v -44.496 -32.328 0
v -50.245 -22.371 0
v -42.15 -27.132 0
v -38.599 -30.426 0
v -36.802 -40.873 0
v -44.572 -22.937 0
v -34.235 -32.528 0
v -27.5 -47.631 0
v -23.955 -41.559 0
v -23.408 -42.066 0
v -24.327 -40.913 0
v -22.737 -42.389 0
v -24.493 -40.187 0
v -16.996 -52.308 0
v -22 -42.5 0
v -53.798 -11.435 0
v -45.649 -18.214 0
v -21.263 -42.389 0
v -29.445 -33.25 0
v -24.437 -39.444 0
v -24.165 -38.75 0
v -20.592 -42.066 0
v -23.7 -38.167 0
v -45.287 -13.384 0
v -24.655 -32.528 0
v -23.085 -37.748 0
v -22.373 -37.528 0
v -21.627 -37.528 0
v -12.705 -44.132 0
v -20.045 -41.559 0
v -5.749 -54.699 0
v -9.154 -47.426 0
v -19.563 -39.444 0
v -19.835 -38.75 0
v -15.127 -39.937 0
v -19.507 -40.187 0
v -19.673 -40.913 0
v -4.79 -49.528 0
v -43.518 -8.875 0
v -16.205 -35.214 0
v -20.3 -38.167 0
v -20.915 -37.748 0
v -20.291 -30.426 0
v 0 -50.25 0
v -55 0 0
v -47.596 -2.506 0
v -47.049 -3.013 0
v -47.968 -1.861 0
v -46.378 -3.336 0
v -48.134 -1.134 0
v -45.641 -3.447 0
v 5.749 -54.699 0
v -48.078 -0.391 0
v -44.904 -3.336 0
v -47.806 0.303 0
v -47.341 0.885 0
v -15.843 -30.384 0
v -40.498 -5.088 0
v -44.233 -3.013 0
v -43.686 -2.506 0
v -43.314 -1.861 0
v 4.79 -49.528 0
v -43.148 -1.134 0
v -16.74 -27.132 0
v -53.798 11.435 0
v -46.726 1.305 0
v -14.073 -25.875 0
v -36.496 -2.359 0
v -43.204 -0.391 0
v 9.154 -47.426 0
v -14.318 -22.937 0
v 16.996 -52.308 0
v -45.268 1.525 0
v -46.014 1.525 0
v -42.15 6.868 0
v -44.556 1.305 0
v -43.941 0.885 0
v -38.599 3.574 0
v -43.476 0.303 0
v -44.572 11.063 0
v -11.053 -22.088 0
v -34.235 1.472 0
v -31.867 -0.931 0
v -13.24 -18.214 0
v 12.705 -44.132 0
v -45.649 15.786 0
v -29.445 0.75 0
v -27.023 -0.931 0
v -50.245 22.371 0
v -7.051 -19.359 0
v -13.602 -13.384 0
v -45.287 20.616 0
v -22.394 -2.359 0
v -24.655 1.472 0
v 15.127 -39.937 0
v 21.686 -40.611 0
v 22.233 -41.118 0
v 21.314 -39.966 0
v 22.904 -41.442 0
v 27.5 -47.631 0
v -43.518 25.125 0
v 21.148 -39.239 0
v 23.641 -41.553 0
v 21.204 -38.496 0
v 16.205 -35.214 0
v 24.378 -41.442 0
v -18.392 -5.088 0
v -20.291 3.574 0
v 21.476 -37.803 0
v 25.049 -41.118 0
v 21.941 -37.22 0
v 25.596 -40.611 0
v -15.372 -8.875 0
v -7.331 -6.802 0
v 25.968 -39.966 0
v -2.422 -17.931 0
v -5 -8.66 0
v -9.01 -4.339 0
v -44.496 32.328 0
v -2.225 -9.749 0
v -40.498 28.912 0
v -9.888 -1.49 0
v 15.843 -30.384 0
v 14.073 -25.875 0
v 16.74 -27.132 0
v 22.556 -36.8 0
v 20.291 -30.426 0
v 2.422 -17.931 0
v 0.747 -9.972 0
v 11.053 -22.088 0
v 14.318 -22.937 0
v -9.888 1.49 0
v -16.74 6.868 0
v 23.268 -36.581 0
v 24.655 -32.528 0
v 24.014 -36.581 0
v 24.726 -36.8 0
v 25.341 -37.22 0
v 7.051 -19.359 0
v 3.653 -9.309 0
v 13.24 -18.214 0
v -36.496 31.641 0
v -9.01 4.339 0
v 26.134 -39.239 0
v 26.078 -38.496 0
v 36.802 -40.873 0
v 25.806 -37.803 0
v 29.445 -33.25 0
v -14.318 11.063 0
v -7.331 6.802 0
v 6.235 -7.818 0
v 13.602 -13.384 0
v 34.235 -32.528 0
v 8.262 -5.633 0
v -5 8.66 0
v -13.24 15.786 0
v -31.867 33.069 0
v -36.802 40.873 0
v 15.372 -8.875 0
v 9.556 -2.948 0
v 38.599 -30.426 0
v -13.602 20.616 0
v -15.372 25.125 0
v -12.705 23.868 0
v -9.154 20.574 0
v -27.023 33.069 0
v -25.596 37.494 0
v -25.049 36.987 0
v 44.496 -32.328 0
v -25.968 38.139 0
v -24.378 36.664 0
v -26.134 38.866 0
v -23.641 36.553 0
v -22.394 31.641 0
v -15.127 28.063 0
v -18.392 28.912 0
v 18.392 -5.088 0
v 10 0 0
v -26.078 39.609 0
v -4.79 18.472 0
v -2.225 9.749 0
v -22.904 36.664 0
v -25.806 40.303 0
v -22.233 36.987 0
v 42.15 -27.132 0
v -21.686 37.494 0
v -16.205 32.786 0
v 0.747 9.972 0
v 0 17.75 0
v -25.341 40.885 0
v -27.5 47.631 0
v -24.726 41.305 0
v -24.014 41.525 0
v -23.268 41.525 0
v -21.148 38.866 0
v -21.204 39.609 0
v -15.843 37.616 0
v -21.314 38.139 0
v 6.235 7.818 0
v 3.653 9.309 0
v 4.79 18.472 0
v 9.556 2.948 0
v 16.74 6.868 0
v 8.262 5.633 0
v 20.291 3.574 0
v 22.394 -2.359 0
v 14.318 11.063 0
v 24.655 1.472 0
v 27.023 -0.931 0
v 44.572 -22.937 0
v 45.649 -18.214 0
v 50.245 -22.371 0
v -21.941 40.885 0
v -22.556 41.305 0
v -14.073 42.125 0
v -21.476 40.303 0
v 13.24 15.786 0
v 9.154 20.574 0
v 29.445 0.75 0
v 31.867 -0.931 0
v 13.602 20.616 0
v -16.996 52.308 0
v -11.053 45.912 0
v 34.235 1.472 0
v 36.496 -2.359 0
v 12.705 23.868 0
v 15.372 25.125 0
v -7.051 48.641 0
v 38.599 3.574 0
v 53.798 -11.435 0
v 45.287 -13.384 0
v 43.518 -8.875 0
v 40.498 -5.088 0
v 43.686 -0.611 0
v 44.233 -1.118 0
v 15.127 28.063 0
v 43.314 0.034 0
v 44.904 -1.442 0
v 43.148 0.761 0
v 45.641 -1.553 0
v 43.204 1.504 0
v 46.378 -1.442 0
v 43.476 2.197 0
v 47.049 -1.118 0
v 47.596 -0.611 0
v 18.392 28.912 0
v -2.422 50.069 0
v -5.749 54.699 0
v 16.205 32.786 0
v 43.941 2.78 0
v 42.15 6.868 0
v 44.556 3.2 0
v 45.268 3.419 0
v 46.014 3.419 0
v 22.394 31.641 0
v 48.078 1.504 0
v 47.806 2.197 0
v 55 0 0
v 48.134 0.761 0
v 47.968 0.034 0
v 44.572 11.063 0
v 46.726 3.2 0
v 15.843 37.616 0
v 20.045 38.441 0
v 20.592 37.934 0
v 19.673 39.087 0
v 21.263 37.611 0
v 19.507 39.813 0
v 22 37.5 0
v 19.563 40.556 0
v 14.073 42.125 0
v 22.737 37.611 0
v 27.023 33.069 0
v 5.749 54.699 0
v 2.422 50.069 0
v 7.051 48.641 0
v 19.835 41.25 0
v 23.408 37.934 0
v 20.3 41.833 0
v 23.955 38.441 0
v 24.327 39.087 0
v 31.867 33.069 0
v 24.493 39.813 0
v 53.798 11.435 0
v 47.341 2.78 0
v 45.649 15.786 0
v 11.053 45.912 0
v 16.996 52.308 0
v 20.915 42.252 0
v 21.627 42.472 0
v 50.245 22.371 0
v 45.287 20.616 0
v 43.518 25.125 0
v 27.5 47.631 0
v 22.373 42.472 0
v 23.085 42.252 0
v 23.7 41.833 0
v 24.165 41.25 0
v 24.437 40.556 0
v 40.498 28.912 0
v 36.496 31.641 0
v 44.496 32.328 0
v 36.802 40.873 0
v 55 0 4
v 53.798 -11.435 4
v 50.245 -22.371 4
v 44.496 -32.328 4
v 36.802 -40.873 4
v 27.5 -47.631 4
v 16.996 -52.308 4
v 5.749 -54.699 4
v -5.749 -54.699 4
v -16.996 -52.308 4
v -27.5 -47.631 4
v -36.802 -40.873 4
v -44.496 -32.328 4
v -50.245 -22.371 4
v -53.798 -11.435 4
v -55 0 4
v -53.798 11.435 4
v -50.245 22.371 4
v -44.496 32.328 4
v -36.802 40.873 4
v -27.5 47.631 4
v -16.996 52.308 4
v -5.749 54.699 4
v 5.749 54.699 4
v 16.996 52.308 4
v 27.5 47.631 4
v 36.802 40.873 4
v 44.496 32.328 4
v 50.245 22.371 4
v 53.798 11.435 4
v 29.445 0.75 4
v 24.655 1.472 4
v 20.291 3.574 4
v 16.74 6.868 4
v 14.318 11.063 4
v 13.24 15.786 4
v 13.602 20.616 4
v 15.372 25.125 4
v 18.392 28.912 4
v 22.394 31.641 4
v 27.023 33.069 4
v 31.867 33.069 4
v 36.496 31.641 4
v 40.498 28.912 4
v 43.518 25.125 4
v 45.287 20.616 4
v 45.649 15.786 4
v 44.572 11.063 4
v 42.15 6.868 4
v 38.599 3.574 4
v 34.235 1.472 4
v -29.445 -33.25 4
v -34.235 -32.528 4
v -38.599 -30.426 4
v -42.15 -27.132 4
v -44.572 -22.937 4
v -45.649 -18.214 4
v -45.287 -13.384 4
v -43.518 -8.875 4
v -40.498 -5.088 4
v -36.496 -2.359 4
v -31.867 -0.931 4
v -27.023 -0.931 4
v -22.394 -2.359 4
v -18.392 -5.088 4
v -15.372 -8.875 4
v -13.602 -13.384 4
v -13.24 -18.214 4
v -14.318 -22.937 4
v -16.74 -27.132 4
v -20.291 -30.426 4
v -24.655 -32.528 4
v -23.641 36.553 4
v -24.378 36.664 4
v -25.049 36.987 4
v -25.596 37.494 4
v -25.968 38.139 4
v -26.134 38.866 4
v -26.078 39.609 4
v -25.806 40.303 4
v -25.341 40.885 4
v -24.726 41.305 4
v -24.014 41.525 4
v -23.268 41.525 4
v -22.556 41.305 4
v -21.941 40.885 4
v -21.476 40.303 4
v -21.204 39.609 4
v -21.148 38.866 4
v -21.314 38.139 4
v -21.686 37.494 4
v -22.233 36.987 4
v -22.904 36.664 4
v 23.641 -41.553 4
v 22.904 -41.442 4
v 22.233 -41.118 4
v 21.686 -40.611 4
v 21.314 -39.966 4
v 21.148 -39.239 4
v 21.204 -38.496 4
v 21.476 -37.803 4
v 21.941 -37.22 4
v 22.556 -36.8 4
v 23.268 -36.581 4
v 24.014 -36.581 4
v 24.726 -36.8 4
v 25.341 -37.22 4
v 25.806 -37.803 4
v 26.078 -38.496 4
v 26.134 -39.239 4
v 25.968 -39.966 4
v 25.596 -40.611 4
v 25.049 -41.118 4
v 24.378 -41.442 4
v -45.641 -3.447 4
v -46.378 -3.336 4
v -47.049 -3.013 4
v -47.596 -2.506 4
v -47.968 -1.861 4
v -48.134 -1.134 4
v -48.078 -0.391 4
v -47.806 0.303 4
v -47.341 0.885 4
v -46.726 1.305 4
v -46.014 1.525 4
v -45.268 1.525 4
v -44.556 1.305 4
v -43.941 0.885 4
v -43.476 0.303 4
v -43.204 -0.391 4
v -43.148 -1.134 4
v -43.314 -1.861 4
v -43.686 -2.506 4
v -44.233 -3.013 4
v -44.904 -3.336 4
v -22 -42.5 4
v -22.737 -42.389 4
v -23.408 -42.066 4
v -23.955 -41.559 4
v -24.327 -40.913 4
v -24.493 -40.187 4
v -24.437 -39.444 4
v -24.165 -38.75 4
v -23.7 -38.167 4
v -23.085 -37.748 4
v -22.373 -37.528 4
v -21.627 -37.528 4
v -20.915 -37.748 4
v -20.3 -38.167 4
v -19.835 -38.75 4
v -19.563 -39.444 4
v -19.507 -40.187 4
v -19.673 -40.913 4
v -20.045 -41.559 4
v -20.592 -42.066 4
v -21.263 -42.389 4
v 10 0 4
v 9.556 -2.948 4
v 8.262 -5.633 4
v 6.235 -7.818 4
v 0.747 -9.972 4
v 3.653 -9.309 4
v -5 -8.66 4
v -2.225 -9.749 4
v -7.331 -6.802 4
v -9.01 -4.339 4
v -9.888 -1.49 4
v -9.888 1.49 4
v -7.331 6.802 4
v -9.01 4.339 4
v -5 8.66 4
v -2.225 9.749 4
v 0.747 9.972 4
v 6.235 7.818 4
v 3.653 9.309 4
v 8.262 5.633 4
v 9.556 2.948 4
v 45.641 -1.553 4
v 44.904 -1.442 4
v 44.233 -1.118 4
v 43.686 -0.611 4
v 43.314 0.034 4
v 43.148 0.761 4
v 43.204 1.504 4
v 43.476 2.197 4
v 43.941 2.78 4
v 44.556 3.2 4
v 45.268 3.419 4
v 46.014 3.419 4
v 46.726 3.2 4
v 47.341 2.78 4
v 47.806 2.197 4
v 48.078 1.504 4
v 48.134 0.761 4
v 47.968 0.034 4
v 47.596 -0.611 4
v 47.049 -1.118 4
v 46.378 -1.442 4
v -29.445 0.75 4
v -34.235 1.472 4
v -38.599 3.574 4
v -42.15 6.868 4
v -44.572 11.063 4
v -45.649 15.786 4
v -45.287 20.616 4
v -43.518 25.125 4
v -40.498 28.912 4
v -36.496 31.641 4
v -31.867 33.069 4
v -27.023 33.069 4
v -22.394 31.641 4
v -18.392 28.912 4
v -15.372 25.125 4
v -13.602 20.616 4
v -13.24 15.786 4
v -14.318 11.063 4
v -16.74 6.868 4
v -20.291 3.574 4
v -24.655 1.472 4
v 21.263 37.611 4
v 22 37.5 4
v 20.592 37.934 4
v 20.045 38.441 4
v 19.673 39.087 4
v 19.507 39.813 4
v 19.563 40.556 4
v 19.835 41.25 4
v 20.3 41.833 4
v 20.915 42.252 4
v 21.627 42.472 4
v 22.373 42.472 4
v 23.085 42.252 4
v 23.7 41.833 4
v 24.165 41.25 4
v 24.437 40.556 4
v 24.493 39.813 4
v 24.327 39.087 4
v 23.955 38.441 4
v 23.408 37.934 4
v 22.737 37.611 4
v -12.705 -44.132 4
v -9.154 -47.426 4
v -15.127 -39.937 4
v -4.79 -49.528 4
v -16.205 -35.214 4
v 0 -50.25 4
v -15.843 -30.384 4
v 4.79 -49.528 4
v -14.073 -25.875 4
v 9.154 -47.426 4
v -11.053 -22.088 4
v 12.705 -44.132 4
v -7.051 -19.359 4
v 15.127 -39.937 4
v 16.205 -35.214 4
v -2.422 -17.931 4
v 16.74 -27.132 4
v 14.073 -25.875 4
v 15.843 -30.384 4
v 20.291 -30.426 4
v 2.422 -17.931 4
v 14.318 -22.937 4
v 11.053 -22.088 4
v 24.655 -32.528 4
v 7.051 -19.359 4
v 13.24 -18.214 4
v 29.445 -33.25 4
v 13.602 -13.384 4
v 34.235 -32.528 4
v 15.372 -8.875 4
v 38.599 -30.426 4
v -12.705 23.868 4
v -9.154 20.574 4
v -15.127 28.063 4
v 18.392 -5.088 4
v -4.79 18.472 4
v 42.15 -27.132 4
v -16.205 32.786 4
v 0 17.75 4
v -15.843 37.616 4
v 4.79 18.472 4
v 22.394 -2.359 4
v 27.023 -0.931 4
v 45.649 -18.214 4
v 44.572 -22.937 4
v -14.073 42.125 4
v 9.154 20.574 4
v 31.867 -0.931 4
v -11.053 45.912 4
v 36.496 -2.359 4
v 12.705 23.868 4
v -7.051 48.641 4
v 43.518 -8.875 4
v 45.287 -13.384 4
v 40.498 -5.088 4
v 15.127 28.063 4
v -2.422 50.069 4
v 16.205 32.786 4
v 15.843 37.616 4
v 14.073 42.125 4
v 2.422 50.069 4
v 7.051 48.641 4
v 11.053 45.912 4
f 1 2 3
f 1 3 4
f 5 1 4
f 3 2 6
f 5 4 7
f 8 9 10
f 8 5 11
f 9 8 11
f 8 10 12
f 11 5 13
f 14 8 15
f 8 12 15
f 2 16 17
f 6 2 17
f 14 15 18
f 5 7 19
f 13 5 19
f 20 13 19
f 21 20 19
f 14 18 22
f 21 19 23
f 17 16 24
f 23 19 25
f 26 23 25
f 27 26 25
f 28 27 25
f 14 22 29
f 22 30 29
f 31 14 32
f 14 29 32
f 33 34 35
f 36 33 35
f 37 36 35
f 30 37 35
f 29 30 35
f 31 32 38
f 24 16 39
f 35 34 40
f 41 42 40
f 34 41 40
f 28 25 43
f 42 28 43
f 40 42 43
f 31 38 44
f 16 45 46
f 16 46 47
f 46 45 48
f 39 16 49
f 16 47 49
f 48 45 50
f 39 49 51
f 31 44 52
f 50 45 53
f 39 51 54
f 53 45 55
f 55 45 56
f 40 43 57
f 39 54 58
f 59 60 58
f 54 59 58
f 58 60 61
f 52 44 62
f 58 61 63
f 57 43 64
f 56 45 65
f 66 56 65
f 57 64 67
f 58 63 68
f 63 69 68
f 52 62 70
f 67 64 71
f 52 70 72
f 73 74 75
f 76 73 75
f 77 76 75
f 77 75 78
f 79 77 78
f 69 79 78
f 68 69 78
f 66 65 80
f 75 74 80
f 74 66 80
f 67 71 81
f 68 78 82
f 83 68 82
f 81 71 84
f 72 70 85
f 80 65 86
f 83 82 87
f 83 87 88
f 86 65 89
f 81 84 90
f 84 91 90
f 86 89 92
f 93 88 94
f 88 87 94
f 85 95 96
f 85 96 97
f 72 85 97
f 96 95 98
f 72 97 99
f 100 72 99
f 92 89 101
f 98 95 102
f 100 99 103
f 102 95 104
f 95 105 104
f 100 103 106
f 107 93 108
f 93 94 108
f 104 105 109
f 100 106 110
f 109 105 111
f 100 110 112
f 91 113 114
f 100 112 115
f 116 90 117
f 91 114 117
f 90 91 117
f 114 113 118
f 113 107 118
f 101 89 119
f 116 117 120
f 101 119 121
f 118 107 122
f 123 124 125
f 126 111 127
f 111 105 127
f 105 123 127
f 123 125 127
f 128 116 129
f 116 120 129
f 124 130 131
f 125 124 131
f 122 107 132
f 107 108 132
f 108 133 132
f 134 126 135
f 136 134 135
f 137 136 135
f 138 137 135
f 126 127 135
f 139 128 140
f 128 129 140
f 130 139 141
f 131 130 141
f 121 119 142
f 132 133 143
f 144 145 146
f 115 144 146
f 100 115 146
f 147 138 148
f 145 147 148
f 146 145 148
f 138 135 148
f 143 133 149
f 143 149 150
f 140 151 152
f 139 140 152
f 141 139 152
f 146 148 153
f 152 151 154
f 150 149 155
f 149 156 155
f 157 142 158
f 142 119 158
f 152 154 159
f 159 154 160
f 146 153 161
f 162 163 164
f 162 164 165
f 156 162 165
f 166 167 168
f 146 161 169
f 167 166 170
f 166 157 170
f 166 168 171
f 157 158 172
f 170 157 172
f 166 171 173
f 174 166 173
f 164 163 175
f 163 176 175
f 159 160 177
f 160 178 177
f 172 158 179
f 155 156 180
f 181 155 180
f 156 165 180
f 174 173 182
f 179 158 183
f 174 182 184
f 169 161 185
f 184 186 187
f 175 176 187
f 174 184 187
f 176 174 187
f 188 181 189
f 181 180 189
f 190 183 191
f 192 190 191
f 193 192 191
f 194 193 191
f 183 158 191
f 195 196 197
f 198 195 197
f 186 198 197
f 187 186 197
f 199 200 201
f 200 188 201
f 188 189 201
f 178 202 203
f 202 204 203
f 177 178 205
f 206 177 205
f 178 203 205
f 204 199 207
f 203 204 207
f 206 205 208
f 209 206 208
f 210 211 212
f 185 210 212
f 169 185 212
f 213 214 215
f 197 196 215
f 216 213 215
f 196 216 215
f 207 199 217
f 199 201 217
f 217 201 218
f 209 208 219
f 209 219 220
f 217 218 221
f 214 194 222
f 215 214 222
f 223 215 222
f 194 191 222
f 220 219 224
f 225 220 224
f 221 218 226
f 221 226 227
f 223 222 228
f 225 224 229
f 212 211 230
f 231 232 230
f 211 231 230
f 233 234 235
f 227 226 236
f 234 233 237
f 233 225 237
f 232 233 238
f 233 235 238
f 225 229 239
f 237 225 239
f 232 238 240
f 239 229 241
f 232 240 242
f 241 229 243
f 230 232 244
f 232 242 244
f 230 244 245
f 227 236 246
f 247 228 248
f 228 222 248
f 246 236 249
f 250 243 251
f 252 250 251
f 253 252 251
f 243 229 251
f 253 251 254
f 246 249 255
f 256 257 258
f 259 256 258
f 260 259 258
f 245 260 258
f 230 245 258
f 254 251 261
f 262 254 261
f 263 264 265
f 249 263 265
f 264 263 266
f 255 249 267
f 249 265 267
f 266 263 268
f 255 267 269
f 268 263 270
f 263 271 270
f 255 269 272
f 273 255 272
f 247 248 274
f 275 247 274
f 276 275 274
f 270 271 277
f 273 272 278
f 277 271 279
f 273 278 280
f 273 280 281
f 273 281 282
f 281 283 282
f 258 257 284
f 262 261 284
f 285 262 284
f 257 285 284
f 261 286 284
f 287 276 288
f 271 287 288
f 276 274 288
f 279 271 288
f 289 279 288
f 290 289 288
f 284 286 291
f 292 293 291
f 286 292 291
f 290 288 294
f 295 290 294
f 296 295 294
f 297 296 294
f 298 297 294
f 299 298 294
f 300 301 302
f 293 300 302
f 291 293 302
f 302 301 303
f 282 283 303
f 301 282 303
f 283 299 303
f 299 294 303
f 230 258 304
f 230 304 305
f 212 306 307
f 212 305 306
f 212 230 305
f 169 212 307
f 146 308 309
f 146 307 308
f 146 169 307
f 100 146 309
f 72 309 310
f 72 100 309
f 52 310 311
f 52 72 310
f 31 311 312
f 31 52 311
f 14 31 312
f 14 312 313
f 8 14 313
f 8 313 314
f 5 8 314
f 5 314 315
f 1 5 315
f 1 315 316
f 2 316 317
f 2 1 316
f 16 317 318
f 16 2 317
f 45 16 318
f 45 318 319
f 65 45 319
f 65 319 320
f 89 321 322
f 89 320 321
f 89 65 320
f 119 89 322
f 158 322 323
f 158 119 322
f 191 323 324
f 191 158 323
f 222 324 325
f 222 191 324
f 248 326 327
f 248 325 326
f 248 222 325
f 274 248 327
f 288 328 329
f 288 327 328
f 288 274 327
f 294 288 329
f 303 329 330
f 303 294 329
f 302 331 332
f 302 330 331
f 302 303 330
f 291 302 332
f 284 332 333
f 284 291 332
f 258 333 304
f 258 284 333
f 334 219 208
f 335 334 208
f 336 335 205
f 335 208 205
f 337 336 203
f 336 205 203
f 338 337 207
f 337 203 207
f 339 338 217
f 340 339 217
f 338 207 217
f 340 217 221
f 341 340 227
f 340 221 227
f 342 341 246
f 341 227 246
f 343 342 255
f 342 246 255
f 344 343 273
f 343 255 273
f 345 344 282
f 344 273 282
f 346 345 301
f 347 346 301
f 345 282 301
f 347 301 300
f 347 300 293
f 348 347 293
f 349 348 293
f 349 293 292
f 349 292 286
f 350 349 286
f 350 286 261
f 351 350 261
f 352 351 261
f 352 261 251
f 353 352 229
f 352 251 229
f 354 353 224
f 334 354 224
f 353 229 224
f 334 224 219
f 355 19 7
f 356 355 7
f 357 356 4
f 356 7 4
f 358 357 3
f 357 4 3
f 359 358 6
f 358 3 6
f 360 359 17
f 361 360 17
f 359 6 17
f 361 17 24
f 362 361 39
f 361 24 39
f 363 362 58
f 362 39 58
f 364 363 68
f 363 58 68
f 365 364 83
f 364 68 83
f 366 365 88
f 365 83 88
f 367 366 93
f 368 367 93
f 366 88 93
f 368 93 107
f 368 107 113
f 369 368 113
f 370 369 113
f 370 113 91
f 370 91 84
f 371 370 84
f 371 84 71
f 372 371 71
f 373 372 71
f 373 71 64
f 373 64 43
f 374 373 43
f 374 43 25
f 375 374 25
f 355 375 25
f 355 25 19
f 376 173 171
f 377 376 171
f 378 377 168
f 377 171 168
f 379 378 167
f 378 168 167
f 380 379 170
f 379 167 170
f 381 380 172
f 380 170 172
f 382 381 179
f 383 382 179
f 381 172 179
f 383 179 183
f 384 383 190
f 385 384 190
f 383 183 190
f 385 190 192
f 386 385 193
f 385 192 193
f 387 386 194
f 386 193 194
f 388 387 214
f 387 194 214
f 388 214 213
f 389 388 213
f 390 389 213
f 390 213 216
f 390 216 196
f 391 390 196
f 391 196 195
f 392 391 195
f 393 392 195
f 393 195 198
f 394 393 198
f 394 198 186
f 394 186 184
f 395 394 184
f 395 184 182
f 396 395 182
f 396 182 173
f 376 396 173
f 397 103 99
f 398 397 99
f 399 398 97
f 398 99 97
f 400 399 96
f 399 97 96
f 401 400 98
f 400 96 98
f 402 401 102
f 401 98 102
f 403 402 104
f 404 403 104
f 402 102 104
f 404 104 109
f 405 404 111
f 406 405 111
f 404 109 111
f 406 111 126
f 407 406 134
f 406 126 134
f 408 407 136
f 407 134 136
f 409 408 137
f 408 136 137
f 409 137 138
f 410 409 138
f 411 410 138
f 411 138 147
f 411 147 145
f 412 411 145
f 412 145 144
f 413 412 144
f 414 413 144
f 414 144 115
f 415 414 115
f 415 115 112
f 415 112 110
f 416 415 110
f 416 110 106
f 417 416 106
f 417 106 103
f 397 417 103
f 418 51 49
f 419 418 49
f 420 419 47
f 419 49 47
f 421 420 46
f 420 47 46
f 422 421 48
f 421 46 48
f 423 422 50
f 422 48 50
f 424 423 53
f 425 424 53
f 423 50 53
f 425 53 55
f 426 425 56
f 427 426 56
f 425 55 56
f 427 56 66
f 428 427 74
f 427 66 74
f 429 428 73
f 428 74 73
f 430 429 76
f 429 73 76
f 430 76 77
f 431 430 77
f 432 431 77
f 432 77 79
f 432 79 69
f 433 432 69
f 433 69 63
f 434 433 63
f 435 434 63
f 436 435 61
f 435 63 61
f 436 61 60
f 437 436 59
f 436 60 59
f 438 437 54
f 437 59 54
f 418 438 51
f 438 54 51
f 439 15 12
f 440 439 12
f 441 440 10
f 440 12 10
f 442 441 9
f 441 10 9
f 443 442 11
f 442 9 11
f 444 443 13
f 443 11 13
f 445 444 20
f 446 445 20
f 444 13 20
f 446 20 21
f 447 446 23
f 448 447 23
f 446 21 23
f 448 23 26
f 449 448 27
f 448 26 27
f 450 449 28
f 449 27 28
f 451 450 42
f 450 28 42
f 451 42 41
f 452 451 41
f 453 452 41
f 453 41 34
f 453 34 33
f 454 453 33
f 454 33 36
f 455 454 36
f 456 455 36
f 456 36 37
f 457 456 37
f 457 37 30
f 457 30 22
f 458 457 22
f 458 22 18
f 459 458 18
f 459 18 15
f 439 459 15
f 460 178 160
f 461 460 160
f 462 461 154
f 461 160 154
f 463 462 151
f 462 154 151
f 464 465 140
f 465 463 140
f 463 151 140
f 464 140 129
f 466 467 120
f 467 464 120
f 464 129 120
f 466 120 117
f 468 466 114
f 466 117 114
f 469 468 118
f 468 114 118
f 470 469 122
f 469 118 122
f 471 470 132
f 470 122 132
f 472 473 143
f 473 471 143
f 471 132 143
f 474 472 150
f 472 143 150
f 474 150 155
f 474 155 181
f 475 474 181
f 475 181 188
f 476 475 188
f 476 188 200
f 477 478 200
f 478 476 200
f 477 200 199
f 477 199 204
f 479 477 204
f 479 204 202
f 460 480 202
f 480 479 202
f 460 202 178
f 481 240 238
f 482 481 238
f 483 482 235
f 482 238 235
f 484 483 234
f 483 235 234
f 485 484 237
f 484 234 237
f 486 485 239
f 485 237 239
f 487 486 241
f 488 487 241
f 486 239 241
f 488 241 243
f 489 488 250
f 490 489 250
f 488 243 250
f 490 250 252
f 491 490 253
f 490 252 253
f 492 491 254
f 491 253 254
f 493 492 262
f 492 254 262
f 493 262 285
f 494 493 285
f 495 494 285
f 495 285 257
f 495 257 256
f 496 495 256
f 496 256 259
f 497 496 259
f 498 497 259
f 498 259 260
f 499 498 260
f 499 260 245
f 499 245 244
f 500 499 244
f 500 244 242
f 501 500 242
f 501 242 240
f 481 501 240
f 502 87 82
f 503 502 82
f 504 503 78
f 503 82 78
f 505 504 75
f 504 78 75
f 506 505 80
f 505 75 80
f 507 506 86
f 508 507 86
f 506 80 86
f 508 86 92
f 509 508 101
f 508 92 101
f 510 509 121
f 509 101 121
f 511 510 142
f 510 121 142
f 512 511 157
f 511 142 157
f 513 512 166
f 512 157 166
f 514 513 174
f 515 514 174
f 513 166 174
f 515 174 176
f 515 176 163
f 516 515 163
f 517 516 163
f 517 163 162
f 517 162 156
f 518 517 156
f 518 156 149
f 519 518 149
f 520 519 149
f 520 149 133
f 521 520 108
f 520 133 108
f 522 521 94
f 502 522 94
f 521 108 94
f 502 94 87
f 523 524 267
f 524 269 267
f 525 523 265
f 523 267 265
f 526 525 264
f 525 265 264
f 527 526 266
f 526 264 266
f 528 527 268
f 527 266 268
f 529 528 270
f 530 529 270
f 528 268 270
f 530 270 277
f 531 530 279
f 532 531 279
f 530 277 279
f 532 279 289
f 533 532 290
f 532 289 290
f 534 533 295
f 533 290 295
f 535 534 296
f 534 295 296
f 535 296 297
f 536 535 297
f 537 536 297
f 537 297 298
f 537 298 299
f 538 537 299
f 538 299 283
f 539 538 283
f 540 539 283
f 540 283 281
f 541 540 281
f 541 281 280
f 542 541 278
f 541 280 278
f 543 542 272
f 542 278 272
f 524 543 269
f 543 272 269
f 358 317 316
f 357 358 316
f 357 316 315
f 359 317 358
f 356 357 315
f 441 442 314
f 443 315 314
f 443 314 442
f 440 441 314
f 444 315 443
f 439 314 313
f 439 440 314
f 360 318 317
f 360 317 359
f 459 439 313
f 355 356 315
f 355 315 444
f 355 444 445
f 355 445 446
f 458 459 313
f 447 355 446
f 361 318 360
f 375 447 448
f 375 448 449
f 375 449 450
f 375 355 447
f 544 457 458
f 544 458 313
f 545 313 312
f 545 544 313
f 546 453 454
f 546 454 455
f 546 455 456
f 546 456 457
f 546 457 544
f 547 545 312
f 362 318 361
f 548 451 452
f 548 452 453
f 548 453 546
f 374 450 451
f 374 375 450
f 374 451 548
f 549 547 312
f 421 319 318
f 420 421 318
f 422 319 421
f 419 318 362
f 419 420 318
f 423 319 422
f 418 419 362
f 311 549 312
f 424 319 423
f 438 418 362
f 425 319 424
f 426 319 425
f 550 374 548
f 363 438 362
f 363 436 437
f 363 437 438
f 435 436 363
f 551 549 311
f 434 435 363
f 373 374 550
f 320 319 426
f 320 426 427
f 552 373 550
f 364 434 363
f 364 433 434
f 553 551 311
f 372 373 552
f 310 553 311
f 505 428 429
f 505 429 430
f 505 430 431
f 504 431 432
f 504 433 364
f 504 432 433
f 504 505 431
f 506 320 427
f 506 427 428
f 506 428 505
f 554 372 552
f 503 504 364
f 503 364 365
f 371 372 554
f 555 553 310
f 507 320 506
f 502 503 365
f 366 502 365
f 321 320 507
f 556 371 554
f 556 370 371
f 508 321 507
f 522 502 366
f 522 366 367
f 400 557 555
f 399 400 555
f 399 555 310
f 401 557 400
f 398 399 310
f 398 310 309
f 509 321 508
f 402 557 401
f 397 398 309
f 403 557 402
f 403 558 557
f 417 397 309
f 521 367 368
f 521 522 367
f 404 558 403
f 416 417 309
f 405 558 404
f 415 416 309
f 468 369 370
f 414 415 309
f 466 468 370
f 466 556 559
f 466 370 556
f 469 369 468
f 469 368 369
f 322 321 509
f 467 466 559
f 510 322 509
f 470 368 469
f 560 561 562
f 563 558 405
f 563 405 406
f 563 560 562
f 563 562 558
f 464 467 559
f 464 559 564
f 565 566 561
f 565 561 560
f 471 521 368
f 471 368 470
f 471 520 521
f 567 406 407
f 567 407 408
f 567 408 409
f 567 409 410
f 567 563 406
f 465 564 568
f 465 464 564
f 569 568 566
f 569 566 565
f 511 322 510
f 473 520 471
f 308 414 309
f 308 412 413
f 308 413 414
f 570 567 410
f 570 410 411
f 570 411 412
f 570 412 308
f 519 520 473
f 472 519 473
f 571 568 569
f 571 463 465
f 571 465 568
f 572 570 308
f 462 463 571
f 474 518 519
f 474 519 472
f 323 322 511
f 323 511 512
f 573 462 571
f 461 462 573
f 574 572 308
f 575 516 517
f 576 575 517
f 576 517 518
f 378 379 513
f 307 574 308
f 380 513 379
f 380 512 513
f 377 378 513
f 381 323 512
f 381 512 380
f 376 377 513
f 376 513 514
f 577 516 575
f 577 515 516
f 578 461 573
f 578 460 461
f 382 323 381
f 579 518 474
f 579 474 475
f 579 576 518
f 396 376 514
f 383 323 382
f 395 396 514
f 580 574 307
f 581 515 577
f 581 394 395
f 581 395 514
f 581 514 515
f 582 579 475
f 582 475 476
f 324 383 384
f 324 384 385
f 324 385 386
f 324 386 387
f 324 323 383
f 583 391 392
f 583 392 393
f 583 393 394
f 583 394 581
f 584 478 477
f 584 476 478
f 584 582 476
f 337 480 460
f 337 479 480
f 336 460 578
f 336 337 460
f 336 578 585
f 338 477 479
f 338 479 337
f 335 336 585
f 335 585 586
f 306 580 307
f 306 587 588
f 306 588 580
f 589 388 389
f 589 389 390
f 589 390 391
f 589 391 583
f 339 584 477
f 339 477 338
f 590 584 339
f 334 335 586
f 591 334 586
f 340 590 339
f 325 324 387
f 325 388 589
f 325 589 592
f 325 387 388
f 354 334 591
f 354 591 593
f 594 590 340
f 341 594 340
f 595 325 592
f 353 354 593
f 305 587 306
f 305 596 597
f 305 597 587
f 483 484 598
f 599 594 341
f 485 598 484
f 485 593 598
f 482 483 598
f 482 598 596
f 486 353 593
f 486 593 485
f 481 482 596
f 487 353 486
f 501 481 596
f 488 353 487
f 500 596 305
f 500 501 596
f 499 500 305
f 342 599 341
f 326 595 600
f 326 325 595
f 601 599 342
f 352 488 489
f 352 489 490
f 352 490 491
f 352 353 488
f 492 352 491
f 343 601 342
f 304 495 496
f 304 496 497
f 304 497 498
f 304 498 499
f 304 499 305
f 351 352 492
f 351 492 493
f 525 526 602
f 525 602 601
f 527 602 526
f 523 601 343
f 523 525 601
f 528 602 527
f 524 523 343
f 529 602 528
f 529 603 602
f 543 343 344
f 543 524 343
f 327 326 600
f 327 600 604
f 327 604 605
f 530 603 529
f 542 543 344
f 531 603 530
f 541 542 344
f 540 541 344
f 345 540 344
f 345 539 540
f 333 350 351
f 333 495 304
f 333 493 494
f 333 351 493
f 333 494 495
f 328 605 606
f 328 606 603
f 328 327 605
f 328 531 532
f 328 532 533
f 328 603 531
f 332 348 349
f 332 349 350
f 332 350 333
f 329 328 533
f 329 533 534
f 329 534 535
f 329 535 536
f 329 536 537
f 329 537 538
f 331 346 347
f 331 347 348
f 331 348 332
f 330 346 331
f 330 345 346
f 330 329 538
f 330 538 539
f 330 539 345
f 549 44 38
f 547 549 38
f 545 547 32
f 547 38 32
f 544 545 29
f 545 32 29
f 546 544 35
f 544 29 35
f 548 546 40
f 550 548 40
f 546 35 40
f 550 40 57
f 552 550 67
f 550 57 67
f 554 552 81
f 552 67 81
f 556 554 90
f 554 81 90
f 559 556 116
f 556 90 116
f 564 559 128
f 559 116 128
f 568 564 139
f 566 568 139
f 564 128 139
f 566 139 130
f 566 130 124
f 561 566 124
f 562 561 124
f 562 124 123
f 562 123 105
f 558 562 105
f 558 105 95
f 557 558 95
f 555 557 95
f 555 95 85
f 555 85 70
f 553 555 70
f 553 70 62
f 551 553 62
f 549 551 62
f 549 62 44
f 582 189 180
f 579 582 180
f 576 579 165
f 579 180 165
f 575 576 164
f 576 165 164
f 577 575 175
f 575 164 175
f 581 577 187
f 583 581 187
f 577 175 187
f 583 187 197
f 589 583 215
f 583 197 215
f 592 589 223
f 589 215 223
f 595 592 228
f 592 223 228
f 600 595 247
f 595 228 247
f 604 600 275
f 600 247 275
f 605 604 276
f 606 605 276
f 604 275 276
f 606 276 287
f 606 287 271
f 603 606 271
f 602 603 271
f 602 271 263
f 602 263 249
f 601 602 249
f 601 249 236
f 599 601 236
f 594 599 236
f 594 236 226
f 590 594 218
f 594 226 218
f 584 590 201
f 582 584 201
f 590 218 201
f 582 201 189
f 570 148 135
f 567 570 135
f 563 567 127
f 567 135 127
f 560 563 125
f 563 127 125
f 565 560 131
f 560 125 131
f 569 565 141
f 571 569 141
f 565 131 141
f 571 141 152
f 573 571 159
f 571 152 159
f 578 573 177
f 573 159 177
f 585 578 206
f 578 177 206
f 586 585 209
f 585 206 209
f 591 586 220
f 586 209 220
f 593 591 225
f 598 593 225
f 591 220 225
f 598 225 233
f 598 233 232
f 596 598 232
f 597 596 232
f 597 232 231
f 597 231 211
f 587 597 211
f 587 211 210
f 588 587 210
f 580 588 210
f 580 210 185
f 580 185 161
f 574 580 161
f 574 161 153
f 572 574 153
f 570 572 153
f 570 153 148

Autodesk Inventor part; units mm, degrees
ref_plane "YZ Plane" through (0, 0, 0) normal (1, 0, 0) x (0, 1, 0)
ref_plane "XZ Plane" through (0, 0, 0) normal (0, 1, 0) x (-1, 0, 0)
ref_plane "XY Plane" through (0, 0, 0) normal (0, 0, 1) x (1, 0, 0)
sketch "Sketch1" plane through (0, 0, 0) normal (0, 0, 1) x (1, 0, 0)
  circle A0 centre (0, 0) radius 55
  circle A1 centre (0, 0) radius 10
  dimension "d0" = 110
  dimension "d1" = 20
extrude "Extrusion1" add sketch "Sketch1" along normal blind 4
sketch "Sketch2" plane through (0, 0, 4) normal (0, 0, 1) x (1, 0, 0)
  point P0 (0, 0)
  point P1 (0, 34)
  point P2 (-29.4449, 17)
  point P3 (-29.4449, -17)
  point P4 (0, -34)
  point P5 (29.4449, -17)
  point P6 (29.4449, 17)
  dimension "d4" = 34
  dimension "d7" = 360
hole "Hole1" at (0, 34, 4) at (-29.4449, 17, 4) at (-29.4449, -17, 4) at (0, -34, 4) at (29.4449, -17, 4) at (29.4449, 17, 4) direction (0, 0, -1) diameter 32.5 end through all
sketch "Sketch3" plane through (0, 0, 4) normal (0, 0, 1) x (1, 0, 0)
  point P0 (0, 0)
  point P1 (22, 40)
  point P2 (-23.641, 39.0526)
  point P3 (-45.641, -0.9474)
  point P4 (-22, -40)
  point P5 (23.641, -39.0526)
  point P6 (45.641, 0.9474)
  dimension "d18" = 360
hole "Hole2" at (22, 40, 4) at (-23.641, 39.0526, 4) at (-45.641, -0.9474, 4) at (-22, -40, 4) at (23.641, -39.0526, 4) at (45.641, 0.9474, 4) direction (0, 0, -1) diameter 5 end through all
equation "\"d14\" = Thickness"
equation "\"BendRadius\" = Thickness"
equation "\"BendReliefWidth\" = Thickness"
equation "\"BendReliefDepth\" = 0.5 * Thickness"
equation "\"CornerReliefSize\" = 4 * Thickness"
equation "\"MinimumRemnant\" = 2 * Thickness"
equation "\"TransitionRadius\" = BendRadius"
equation "\"JacobiRadiusSize\" = BendRadius"
equation "\"GapSize\" = Thickness"
equation "\"Thickness\" = 0.5"
properties part number "Electromagnetic cover bottom"
